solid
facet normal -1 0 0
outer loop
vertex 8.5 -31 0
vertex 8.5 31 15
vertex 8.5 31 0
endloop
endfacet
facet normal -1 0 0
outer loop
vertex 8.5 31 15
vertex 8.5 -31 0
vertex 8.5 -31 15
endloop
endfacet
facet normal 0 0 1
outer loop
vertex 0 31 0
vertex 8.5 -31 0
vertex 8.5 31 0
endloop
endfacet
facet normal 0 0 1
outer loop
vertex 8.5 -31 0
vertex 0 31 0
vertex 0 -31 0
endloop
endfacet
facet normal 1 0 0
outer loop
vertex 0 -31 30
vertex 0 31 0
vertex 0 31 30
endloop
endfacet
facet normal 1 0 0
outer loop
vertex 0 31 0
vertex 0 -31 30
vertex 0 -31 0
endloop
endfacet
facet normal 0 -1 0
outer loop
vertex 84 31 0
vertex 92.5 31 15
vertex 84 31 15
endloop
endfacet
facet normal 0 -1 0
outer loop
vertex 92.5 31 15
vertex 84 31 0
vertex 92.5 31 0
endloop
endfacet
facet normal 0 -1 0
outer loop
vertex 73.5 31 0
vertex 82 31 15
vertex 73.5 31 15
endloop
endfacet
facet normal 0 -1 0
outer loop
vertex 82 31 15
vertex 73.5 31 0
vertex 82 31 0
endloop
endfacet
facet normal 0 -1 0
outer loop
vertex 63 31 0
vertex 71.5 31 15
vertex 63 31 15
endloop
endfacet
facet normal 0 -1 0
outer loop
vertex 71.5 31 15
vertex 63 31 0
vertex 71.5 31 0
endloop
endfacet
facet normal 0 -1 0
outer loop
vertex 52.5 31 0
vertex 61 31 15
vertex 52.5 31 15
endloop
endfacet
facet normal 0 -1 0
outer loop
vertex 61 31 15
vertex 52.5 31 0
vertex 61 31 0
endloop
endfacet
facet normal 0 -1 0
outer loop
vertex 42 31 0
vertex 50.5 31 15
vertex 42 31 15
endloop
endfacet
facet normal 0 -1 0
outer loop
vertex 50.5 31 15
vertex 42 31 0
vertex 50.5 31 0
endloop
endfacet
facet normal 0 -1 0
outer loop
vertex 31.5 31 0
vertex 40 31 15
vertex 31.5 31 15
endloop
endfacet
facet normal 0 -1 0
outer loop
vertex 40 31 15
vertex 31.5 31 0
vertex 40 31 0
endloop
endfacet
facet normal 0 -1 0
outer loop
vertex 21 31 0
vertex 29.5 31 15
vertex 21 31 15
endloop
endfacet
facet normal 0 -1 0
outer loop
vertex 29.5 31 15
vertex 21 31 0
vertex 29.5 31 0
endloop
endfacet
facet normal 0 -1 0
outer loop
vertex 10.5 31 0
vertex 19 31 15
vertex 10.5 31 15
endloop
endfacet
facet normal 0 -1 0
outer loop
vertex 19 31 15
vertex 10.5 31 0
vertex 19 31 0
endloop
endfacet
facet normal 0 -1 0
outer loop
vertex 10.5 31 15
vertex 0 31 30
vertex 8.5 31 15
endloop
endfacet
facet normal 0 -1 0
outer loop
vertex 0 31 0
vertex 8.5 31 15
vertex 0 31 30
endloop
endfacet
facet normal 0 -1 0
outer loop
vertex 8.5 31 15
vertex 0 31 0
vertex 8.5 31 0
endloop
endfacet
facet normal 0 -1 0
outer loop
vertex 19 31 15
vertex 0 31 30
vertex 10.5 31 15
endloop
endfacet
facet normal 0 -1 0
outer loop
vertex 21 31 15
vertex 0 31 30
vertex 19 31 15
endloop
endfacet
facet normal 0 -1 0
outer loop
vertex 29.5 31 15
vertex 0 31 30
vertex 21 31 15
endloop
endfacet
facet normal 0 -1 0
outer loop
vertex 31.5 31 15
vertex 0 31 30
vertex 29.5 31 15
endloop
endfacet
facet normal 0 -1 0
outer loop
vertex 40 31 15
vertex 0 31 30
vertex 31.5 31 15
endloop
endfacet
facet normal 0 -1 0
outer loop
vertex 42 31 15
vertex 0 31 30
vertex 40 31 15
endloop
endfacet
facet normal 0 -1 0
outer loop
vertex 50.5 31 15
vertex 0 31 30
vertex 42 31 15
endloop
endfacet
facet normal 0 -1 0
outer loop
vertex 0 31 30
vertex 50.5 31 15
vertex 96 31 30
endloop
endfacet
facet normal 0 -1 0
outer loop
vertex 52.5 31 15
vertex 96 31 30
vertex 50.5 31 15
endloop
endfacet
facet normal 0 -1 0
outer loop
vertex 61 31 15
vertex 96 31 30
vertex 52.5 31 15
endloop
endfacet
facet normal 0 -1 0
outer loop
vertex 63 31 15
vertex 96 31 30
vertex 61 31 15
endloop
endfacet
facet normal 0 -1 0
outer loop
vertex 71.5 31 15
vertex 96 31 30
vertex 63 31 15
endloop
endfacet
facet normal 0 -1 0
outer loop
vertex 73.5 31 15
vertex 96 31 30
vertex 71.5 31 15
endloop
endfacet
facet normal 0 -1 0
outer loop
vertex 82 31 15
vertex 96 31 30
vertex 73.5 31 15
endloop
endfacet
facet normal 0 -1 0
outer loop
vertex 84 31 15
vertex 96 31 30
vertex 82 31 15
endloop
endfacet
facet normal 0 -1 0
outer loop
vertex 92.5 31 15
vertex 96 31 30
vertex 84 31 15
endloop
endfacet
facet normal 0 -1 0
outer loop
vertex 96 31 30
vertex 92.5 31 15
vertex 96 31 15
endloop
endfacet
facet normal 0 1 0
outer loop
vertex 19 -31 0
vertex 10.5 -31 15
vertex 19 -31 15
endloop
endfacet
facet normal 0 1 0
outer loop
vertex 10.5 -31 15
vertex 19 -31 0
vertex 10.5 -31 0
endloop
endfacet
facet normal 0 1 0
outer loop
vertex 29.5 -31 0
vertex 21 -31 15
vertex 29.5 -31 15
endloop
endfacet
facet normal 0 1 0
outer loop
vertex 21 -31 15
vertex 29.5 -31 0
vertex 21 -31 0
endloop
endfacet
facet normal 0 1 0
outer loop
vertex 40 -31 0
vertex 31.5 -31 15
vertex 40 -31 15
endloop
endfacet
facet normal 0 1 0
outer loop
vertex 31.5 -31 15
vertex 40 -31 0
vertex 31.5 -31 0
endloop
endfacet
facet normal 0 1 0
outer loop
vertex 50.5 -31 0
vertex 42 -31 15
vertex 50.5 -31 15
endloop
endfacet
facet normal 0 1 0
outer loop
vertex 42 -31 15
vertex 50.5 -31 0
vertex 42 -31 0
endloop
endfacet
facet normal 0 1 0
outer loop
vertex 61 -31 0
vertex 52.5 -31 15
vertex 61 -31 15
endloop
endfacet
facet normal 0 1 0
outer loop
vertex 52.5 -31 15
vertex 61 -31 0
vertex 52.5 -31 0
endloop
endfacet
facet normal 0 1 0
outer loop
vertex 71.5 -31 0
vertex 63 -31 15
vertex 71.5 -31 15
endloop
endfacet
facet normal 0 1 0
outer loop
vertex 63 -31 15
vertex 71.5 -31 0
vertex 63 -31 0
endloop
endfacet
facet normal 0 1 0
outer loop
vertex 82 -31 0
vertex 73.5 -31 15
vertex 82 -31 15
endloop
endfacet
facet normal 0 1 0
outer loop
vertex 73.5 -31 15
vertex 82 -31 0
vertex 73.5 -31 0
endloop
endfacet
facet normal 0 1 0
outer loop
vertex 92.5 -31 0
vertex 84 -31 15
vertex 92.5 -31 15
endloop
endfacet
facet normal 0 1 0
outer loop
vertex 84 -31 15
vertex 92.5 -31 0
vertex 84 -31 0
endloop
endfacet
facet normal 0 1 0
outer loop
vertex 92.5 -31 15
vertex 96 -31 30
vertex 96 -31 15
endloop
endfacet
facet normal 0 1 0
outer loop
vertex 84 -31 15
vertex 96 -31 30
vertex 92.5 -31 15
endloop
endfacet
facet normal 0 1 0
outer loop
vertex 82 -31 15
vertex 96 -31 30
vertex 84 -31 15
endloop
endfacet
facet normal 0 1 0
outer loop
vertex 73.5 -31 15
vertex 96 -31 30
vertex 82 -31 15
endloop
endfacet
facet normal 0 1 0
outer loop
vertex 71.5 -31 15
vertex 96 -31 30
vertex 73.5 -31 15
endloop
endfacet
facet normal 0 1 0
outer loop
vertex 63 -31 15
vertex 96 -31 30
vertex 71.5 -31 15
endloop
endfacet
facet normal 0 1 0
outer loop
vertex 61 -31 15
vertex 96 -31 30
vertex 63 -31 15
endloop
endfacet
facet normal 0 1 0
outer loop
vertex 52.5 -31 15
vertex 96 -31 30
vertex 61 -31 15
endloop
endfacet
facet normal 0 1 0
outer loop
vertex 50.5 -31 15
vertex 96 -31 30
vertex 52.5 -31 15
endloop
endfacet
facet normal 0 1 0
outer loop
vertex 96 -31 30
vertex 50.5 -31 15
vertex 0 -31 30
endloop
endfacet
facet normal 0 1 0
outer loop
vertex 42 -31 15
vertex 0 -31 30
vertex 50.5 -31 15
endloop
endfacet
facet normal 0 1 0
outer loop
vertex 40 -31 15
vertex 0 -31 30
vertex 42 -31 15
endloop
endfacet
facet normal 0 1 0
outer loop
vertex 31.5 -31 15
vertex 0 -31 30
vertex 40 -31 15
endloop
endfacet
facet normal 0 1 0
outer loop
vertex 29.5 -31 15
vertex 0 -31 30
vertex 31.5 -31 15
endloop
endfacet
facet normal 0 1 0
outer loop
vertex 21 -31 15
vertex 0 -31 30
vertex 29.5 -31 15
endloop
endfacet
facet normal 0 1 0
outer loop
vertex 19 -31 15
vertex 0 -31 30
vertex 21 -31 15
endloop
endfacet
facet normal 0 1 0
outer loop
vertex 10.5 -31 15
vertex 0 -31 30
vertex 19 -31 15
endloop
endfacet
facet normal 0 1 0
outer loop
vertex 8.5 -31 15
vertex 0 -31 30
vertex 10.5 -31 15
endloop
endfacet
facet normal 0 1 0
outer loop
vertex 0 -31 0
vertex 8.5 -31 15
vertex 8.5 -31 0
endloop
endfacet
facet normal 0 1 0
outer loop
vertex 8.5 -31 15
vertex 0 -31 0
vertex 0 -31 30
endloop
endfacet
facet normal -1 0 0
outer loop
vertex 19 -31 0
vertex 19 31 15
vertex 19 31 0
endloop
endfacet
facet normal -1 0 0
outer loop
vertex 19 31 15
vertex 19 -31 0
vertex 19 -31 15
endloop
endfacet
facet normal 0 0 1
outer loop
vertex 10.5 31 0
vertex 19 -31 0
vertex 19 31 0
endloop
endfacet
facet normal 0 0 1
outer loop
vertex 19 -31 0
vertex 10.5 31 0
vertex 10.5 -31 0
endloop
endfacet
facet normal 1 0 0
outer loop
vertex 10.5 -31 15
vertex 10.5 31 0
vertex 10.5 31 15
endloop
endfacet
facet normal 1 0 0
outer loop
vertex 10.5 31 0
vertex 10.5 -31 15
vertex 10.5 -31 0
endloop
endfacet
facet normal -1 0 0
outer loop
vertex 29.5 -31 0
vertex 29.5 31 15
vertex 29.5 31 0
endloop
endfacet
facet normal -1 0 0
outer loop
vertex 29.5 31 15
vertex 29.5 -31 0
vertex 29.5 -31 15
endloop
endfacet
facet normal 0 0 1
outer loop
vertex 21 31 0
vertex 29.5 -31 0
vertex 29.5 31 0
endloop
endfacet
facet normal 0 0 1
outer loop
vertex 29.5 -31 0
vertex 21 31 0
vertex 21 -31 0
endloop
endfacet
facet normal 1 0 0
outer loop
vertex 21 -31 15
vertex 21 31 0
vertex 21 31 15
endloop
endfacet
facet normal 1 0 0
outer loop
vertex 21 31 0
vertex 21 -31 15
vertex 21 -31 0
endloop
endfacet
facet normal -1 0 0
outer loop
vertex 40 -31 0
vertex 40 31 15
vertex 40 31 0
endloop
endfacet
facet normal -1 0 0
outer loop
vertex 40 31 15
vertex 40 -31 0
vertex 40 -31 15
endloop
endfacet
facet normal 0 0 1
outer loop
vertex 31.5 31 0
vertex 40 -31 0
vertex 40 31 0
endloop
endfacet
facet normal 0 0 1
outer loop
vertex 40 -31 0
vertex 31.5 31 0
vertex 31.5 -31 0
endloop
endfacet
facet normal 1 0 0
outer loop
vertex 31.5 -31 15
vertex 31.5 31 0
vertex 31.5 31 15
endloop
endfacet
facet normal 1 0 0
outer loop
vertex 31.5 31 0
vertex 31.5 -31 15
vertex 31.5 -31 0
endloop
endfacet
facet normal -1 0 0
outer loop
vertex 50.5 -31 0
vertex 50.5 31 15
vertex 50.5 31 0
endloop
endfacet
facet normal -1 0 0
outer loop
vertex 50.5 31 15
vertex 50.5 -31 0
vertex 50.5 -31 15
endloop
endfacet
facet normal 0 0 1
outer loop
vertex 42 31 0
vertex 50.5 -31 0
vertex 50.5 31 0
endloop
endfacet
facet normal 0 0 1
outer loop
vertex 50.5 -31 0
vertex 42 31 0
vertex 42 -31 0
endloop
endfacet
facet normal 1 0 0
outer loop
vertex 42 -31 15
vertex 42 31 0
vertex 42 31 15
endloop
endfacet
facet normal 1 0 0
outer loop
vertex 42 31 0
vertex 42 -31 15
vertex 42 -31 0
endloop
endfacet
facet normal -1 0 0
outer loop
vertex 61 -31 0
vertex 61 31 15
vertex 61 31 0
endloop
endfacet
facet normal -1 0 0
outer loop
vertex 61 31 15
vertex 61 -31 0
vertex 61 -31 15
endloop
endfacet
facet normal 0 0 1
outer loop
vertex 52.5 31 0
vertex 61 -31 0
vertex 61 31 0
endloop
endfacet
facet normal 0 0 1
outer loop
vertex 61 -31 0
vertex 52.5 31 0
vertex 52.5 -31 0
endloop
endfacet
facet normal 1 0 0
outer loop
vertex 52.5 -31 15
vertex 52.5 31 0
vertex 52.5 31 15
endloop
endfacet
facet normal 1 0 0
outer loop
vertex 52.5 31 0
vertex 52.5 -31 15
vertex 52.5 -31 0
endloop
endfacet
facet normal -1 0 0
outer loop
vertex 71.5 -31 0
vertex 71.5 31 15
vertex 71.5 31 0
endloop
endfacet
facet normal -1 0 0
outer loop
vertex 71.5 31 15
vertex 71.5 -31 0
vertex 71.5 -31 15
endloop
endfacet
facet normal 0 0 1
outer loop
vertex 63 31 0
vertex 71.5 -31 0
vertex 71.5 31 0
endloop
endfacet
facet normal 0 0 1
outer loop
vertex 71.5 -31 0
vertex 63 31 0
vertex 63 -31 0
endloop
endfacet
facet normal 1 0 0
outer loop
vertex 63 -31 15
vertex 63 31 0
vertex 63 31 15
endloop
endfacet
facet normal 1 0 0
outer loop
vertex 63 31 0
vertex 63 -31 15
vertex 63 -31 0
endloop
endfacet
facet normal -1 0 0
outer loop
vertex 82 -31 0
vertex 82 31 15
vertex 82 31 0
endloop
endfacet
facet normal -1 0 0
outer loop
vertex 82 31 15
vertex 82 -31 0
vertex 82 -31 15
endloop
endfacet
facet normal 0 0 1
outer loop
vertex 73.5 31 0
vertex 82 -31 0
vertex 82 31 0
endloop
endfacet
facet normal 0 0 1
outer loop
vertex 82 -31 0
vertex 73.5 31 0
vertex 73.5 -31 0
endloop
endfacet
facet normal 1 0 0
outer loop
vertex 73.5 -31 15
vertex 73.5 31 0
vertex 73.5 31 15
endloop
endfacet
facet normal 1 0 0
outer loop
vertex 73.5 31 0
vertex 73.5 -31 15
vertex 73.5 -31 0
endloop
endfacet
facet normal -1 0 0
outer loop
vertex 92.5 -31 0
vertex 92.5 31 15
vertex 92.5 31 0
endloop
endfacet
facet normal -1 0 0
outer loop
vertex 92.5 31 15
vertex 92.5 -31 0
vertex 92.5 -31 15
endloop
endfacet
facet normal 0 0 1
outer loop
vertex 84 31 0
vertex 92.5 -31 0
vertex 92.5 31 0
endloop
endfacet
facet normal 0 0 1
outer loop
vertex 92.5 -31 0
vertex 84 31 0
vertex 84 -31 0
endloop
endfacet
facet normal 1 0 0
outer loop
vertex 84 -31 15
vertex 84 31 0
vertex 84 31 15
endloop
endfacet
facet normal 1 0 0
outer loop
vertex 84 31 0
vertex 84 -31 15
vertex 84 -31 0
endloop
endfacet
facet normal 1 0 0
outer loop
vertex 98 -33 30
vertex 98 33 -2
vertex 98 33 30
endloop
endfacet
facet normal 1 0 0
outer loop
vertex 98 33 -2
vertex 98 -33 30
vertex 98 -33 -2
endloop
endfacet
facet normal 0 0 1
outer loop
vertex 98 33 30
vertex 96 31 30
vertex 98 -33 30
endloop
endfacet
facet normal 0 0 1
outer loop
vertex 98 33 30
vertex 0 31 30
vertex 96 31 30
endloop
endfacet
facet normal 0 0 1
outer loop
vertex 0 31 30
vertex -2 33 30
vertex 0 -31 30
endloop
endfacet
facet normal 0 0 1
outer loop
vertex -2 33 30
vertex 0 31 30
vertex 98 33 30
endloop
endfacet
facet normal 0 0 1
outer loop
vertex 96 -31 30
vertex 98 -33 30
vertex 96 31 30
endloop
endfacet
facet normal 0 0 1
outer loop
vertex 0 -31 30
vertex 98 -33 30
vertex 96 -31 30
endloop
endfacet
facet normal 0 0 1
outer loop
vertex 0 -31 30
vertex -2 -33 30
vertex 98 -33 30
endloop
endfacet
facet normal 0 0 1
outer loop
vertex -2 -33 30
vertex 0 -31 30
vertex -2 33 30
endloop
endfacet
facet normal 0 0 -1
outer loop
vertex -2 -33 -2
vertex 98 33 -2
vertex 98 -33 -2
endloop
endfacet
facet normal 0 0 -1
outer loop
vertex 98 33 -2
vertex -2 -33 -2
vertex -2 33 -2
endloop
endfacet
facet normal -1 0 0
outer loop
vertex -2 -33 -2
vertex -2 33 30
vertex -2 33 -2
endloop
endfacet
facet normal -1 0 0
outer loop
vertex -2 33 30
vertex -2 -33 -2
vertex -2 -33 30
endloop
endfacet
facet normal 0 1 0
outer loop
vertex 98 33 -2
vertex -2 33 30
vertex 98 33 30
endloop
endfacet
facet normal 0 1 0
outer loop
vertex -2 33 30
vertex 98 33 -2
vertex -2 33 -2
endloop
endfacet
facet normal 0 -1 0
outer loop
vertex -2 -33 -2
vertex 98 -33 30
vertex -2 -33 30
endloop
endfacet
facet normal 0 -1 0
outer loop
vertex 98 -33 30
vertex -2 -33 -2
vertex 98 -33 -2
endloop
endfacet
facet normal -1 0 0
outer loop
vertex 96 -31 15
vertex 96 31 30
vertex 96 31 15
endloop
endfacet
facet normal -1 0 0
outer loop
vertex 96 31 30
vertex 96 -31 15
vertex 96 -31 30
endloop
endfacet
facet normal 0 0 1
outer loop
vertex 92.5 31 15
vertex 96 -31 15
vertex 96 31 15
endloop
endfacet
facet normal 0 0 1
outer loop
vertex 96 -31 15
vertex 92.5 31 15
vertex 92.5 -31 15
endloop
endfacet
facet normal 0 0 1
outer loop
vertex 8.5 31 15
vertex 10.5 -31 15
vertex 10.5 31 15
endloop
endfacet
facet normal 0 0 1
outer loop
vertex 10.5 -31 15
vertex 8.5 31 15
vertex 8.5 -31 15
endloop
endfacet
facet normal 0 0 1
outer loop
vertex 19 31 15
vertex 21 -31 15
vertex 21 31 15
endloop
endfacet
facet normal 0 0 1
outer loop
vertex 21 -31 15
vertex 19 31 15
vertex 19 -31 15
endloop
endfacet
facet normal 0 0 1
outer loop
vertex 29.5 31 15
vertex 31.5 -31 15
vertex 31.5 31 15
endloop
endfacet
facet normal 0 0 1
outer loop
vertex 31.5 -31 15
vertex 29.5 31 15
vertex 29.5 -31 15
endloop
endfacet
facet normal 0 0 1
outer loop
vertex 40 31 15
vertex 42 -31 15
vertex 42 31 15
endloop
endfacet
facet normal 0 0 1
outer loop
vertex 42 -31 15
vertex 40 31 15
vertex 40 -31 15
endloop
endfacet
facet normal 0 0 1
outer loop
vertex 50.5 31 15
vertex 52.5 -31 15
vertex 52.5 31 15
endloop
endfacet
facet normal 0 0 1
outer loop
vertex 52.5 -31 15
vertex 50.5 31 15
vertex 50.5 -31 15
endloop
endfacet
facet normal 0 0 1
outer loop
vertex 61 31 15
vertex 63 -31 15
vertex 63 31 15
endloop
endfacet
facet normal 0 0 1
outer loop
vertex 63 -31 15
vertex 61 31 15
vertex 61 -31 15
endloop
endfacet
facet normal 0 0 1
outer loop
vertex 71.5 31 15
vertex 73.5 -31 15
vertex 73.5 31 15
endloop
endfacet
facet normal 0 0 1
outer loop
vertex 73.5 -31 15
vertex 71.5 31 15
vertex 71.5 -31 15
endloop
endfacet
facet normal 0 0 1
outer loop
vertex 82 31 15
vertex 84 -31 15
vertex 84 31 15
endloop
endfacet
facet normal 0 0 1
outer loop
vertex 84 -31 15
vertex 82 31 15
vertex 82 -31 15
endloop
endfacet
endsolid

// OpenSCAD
// Caddy / Wheel Dimensions
caddyDiameter = 60;
caddyThickness = 7.5;

// When leaning adjacent wheels away from each other against internal stops
// the required distance between them is GAP
gap = 10;

// Height of the dividing walls between slots
slotHeight = caddyDiameter / 4;

// Wall Thickness
wallThickness = 2;

// Tray Dimensions 
trayLength = 100;

color("White")
    tray(caddyDiameter, caddyThickness, gap, slotHeight, 2, wallThickness, trayLength, caddyDiameter / 2);

module tray(wheelDiameter, wheelThickness, gap, slotHeight, wheelTolerance, wallThickness, trayLength, trayHeight) {
    
    // Gap per side is 
    gapPerSide = (gap - wallThickness) / 2;
    
    // lean angle to get gap is arcsign(gapPerSide/height of wheel)
    angle = asin(gapPerSide / wheelDiameter);
    
    // Width is the sum of the missing sides of the triangle, based on the height of the slot, and the thickness of the wheel
    slotWidth = ceil((wheelThickness * cos(angle) + slotHeight * sin(angle))*10)/10;

    slots = floor((trayLength - wallThickness) / (slotWidth + wallThickness));
    
    // Display the parameters
    echo (slotWidth=slotWidth, slotHeight=slotHeight, slots=slots);
    
    // Tray Width needs to be wheelDiameter + tolerance + wallThickness
    widthWithTolerance = wheelDiameter + wheelTolerance;
    trayWidth = (wheelDiameter + wheelTolerance) + 2*wallThickness;
    
    // Create the tray
    difference () {
        translate([-wallThickness, -trayWidth / 2, -wallThickness]) {
            cube([trayLength, trayWidth, trayHeight + wheelTolerance]);
        }
        
        // Remove the the top portion        
        translate([0, -(widthWithTolerance/2), slotHeight])
        cube([trayLength - 2*wallThickness, widthWithTolerance, 40]);
        
        // Cut the slots
        for(i=[0:slots - 1]) {
            translate([i*(slotWidth + wallThickness), -widthWithTolerance/2], 0)
                cube([slotWidth, widthWithTolerance, wheelDiameter]);
        }
    }
}
